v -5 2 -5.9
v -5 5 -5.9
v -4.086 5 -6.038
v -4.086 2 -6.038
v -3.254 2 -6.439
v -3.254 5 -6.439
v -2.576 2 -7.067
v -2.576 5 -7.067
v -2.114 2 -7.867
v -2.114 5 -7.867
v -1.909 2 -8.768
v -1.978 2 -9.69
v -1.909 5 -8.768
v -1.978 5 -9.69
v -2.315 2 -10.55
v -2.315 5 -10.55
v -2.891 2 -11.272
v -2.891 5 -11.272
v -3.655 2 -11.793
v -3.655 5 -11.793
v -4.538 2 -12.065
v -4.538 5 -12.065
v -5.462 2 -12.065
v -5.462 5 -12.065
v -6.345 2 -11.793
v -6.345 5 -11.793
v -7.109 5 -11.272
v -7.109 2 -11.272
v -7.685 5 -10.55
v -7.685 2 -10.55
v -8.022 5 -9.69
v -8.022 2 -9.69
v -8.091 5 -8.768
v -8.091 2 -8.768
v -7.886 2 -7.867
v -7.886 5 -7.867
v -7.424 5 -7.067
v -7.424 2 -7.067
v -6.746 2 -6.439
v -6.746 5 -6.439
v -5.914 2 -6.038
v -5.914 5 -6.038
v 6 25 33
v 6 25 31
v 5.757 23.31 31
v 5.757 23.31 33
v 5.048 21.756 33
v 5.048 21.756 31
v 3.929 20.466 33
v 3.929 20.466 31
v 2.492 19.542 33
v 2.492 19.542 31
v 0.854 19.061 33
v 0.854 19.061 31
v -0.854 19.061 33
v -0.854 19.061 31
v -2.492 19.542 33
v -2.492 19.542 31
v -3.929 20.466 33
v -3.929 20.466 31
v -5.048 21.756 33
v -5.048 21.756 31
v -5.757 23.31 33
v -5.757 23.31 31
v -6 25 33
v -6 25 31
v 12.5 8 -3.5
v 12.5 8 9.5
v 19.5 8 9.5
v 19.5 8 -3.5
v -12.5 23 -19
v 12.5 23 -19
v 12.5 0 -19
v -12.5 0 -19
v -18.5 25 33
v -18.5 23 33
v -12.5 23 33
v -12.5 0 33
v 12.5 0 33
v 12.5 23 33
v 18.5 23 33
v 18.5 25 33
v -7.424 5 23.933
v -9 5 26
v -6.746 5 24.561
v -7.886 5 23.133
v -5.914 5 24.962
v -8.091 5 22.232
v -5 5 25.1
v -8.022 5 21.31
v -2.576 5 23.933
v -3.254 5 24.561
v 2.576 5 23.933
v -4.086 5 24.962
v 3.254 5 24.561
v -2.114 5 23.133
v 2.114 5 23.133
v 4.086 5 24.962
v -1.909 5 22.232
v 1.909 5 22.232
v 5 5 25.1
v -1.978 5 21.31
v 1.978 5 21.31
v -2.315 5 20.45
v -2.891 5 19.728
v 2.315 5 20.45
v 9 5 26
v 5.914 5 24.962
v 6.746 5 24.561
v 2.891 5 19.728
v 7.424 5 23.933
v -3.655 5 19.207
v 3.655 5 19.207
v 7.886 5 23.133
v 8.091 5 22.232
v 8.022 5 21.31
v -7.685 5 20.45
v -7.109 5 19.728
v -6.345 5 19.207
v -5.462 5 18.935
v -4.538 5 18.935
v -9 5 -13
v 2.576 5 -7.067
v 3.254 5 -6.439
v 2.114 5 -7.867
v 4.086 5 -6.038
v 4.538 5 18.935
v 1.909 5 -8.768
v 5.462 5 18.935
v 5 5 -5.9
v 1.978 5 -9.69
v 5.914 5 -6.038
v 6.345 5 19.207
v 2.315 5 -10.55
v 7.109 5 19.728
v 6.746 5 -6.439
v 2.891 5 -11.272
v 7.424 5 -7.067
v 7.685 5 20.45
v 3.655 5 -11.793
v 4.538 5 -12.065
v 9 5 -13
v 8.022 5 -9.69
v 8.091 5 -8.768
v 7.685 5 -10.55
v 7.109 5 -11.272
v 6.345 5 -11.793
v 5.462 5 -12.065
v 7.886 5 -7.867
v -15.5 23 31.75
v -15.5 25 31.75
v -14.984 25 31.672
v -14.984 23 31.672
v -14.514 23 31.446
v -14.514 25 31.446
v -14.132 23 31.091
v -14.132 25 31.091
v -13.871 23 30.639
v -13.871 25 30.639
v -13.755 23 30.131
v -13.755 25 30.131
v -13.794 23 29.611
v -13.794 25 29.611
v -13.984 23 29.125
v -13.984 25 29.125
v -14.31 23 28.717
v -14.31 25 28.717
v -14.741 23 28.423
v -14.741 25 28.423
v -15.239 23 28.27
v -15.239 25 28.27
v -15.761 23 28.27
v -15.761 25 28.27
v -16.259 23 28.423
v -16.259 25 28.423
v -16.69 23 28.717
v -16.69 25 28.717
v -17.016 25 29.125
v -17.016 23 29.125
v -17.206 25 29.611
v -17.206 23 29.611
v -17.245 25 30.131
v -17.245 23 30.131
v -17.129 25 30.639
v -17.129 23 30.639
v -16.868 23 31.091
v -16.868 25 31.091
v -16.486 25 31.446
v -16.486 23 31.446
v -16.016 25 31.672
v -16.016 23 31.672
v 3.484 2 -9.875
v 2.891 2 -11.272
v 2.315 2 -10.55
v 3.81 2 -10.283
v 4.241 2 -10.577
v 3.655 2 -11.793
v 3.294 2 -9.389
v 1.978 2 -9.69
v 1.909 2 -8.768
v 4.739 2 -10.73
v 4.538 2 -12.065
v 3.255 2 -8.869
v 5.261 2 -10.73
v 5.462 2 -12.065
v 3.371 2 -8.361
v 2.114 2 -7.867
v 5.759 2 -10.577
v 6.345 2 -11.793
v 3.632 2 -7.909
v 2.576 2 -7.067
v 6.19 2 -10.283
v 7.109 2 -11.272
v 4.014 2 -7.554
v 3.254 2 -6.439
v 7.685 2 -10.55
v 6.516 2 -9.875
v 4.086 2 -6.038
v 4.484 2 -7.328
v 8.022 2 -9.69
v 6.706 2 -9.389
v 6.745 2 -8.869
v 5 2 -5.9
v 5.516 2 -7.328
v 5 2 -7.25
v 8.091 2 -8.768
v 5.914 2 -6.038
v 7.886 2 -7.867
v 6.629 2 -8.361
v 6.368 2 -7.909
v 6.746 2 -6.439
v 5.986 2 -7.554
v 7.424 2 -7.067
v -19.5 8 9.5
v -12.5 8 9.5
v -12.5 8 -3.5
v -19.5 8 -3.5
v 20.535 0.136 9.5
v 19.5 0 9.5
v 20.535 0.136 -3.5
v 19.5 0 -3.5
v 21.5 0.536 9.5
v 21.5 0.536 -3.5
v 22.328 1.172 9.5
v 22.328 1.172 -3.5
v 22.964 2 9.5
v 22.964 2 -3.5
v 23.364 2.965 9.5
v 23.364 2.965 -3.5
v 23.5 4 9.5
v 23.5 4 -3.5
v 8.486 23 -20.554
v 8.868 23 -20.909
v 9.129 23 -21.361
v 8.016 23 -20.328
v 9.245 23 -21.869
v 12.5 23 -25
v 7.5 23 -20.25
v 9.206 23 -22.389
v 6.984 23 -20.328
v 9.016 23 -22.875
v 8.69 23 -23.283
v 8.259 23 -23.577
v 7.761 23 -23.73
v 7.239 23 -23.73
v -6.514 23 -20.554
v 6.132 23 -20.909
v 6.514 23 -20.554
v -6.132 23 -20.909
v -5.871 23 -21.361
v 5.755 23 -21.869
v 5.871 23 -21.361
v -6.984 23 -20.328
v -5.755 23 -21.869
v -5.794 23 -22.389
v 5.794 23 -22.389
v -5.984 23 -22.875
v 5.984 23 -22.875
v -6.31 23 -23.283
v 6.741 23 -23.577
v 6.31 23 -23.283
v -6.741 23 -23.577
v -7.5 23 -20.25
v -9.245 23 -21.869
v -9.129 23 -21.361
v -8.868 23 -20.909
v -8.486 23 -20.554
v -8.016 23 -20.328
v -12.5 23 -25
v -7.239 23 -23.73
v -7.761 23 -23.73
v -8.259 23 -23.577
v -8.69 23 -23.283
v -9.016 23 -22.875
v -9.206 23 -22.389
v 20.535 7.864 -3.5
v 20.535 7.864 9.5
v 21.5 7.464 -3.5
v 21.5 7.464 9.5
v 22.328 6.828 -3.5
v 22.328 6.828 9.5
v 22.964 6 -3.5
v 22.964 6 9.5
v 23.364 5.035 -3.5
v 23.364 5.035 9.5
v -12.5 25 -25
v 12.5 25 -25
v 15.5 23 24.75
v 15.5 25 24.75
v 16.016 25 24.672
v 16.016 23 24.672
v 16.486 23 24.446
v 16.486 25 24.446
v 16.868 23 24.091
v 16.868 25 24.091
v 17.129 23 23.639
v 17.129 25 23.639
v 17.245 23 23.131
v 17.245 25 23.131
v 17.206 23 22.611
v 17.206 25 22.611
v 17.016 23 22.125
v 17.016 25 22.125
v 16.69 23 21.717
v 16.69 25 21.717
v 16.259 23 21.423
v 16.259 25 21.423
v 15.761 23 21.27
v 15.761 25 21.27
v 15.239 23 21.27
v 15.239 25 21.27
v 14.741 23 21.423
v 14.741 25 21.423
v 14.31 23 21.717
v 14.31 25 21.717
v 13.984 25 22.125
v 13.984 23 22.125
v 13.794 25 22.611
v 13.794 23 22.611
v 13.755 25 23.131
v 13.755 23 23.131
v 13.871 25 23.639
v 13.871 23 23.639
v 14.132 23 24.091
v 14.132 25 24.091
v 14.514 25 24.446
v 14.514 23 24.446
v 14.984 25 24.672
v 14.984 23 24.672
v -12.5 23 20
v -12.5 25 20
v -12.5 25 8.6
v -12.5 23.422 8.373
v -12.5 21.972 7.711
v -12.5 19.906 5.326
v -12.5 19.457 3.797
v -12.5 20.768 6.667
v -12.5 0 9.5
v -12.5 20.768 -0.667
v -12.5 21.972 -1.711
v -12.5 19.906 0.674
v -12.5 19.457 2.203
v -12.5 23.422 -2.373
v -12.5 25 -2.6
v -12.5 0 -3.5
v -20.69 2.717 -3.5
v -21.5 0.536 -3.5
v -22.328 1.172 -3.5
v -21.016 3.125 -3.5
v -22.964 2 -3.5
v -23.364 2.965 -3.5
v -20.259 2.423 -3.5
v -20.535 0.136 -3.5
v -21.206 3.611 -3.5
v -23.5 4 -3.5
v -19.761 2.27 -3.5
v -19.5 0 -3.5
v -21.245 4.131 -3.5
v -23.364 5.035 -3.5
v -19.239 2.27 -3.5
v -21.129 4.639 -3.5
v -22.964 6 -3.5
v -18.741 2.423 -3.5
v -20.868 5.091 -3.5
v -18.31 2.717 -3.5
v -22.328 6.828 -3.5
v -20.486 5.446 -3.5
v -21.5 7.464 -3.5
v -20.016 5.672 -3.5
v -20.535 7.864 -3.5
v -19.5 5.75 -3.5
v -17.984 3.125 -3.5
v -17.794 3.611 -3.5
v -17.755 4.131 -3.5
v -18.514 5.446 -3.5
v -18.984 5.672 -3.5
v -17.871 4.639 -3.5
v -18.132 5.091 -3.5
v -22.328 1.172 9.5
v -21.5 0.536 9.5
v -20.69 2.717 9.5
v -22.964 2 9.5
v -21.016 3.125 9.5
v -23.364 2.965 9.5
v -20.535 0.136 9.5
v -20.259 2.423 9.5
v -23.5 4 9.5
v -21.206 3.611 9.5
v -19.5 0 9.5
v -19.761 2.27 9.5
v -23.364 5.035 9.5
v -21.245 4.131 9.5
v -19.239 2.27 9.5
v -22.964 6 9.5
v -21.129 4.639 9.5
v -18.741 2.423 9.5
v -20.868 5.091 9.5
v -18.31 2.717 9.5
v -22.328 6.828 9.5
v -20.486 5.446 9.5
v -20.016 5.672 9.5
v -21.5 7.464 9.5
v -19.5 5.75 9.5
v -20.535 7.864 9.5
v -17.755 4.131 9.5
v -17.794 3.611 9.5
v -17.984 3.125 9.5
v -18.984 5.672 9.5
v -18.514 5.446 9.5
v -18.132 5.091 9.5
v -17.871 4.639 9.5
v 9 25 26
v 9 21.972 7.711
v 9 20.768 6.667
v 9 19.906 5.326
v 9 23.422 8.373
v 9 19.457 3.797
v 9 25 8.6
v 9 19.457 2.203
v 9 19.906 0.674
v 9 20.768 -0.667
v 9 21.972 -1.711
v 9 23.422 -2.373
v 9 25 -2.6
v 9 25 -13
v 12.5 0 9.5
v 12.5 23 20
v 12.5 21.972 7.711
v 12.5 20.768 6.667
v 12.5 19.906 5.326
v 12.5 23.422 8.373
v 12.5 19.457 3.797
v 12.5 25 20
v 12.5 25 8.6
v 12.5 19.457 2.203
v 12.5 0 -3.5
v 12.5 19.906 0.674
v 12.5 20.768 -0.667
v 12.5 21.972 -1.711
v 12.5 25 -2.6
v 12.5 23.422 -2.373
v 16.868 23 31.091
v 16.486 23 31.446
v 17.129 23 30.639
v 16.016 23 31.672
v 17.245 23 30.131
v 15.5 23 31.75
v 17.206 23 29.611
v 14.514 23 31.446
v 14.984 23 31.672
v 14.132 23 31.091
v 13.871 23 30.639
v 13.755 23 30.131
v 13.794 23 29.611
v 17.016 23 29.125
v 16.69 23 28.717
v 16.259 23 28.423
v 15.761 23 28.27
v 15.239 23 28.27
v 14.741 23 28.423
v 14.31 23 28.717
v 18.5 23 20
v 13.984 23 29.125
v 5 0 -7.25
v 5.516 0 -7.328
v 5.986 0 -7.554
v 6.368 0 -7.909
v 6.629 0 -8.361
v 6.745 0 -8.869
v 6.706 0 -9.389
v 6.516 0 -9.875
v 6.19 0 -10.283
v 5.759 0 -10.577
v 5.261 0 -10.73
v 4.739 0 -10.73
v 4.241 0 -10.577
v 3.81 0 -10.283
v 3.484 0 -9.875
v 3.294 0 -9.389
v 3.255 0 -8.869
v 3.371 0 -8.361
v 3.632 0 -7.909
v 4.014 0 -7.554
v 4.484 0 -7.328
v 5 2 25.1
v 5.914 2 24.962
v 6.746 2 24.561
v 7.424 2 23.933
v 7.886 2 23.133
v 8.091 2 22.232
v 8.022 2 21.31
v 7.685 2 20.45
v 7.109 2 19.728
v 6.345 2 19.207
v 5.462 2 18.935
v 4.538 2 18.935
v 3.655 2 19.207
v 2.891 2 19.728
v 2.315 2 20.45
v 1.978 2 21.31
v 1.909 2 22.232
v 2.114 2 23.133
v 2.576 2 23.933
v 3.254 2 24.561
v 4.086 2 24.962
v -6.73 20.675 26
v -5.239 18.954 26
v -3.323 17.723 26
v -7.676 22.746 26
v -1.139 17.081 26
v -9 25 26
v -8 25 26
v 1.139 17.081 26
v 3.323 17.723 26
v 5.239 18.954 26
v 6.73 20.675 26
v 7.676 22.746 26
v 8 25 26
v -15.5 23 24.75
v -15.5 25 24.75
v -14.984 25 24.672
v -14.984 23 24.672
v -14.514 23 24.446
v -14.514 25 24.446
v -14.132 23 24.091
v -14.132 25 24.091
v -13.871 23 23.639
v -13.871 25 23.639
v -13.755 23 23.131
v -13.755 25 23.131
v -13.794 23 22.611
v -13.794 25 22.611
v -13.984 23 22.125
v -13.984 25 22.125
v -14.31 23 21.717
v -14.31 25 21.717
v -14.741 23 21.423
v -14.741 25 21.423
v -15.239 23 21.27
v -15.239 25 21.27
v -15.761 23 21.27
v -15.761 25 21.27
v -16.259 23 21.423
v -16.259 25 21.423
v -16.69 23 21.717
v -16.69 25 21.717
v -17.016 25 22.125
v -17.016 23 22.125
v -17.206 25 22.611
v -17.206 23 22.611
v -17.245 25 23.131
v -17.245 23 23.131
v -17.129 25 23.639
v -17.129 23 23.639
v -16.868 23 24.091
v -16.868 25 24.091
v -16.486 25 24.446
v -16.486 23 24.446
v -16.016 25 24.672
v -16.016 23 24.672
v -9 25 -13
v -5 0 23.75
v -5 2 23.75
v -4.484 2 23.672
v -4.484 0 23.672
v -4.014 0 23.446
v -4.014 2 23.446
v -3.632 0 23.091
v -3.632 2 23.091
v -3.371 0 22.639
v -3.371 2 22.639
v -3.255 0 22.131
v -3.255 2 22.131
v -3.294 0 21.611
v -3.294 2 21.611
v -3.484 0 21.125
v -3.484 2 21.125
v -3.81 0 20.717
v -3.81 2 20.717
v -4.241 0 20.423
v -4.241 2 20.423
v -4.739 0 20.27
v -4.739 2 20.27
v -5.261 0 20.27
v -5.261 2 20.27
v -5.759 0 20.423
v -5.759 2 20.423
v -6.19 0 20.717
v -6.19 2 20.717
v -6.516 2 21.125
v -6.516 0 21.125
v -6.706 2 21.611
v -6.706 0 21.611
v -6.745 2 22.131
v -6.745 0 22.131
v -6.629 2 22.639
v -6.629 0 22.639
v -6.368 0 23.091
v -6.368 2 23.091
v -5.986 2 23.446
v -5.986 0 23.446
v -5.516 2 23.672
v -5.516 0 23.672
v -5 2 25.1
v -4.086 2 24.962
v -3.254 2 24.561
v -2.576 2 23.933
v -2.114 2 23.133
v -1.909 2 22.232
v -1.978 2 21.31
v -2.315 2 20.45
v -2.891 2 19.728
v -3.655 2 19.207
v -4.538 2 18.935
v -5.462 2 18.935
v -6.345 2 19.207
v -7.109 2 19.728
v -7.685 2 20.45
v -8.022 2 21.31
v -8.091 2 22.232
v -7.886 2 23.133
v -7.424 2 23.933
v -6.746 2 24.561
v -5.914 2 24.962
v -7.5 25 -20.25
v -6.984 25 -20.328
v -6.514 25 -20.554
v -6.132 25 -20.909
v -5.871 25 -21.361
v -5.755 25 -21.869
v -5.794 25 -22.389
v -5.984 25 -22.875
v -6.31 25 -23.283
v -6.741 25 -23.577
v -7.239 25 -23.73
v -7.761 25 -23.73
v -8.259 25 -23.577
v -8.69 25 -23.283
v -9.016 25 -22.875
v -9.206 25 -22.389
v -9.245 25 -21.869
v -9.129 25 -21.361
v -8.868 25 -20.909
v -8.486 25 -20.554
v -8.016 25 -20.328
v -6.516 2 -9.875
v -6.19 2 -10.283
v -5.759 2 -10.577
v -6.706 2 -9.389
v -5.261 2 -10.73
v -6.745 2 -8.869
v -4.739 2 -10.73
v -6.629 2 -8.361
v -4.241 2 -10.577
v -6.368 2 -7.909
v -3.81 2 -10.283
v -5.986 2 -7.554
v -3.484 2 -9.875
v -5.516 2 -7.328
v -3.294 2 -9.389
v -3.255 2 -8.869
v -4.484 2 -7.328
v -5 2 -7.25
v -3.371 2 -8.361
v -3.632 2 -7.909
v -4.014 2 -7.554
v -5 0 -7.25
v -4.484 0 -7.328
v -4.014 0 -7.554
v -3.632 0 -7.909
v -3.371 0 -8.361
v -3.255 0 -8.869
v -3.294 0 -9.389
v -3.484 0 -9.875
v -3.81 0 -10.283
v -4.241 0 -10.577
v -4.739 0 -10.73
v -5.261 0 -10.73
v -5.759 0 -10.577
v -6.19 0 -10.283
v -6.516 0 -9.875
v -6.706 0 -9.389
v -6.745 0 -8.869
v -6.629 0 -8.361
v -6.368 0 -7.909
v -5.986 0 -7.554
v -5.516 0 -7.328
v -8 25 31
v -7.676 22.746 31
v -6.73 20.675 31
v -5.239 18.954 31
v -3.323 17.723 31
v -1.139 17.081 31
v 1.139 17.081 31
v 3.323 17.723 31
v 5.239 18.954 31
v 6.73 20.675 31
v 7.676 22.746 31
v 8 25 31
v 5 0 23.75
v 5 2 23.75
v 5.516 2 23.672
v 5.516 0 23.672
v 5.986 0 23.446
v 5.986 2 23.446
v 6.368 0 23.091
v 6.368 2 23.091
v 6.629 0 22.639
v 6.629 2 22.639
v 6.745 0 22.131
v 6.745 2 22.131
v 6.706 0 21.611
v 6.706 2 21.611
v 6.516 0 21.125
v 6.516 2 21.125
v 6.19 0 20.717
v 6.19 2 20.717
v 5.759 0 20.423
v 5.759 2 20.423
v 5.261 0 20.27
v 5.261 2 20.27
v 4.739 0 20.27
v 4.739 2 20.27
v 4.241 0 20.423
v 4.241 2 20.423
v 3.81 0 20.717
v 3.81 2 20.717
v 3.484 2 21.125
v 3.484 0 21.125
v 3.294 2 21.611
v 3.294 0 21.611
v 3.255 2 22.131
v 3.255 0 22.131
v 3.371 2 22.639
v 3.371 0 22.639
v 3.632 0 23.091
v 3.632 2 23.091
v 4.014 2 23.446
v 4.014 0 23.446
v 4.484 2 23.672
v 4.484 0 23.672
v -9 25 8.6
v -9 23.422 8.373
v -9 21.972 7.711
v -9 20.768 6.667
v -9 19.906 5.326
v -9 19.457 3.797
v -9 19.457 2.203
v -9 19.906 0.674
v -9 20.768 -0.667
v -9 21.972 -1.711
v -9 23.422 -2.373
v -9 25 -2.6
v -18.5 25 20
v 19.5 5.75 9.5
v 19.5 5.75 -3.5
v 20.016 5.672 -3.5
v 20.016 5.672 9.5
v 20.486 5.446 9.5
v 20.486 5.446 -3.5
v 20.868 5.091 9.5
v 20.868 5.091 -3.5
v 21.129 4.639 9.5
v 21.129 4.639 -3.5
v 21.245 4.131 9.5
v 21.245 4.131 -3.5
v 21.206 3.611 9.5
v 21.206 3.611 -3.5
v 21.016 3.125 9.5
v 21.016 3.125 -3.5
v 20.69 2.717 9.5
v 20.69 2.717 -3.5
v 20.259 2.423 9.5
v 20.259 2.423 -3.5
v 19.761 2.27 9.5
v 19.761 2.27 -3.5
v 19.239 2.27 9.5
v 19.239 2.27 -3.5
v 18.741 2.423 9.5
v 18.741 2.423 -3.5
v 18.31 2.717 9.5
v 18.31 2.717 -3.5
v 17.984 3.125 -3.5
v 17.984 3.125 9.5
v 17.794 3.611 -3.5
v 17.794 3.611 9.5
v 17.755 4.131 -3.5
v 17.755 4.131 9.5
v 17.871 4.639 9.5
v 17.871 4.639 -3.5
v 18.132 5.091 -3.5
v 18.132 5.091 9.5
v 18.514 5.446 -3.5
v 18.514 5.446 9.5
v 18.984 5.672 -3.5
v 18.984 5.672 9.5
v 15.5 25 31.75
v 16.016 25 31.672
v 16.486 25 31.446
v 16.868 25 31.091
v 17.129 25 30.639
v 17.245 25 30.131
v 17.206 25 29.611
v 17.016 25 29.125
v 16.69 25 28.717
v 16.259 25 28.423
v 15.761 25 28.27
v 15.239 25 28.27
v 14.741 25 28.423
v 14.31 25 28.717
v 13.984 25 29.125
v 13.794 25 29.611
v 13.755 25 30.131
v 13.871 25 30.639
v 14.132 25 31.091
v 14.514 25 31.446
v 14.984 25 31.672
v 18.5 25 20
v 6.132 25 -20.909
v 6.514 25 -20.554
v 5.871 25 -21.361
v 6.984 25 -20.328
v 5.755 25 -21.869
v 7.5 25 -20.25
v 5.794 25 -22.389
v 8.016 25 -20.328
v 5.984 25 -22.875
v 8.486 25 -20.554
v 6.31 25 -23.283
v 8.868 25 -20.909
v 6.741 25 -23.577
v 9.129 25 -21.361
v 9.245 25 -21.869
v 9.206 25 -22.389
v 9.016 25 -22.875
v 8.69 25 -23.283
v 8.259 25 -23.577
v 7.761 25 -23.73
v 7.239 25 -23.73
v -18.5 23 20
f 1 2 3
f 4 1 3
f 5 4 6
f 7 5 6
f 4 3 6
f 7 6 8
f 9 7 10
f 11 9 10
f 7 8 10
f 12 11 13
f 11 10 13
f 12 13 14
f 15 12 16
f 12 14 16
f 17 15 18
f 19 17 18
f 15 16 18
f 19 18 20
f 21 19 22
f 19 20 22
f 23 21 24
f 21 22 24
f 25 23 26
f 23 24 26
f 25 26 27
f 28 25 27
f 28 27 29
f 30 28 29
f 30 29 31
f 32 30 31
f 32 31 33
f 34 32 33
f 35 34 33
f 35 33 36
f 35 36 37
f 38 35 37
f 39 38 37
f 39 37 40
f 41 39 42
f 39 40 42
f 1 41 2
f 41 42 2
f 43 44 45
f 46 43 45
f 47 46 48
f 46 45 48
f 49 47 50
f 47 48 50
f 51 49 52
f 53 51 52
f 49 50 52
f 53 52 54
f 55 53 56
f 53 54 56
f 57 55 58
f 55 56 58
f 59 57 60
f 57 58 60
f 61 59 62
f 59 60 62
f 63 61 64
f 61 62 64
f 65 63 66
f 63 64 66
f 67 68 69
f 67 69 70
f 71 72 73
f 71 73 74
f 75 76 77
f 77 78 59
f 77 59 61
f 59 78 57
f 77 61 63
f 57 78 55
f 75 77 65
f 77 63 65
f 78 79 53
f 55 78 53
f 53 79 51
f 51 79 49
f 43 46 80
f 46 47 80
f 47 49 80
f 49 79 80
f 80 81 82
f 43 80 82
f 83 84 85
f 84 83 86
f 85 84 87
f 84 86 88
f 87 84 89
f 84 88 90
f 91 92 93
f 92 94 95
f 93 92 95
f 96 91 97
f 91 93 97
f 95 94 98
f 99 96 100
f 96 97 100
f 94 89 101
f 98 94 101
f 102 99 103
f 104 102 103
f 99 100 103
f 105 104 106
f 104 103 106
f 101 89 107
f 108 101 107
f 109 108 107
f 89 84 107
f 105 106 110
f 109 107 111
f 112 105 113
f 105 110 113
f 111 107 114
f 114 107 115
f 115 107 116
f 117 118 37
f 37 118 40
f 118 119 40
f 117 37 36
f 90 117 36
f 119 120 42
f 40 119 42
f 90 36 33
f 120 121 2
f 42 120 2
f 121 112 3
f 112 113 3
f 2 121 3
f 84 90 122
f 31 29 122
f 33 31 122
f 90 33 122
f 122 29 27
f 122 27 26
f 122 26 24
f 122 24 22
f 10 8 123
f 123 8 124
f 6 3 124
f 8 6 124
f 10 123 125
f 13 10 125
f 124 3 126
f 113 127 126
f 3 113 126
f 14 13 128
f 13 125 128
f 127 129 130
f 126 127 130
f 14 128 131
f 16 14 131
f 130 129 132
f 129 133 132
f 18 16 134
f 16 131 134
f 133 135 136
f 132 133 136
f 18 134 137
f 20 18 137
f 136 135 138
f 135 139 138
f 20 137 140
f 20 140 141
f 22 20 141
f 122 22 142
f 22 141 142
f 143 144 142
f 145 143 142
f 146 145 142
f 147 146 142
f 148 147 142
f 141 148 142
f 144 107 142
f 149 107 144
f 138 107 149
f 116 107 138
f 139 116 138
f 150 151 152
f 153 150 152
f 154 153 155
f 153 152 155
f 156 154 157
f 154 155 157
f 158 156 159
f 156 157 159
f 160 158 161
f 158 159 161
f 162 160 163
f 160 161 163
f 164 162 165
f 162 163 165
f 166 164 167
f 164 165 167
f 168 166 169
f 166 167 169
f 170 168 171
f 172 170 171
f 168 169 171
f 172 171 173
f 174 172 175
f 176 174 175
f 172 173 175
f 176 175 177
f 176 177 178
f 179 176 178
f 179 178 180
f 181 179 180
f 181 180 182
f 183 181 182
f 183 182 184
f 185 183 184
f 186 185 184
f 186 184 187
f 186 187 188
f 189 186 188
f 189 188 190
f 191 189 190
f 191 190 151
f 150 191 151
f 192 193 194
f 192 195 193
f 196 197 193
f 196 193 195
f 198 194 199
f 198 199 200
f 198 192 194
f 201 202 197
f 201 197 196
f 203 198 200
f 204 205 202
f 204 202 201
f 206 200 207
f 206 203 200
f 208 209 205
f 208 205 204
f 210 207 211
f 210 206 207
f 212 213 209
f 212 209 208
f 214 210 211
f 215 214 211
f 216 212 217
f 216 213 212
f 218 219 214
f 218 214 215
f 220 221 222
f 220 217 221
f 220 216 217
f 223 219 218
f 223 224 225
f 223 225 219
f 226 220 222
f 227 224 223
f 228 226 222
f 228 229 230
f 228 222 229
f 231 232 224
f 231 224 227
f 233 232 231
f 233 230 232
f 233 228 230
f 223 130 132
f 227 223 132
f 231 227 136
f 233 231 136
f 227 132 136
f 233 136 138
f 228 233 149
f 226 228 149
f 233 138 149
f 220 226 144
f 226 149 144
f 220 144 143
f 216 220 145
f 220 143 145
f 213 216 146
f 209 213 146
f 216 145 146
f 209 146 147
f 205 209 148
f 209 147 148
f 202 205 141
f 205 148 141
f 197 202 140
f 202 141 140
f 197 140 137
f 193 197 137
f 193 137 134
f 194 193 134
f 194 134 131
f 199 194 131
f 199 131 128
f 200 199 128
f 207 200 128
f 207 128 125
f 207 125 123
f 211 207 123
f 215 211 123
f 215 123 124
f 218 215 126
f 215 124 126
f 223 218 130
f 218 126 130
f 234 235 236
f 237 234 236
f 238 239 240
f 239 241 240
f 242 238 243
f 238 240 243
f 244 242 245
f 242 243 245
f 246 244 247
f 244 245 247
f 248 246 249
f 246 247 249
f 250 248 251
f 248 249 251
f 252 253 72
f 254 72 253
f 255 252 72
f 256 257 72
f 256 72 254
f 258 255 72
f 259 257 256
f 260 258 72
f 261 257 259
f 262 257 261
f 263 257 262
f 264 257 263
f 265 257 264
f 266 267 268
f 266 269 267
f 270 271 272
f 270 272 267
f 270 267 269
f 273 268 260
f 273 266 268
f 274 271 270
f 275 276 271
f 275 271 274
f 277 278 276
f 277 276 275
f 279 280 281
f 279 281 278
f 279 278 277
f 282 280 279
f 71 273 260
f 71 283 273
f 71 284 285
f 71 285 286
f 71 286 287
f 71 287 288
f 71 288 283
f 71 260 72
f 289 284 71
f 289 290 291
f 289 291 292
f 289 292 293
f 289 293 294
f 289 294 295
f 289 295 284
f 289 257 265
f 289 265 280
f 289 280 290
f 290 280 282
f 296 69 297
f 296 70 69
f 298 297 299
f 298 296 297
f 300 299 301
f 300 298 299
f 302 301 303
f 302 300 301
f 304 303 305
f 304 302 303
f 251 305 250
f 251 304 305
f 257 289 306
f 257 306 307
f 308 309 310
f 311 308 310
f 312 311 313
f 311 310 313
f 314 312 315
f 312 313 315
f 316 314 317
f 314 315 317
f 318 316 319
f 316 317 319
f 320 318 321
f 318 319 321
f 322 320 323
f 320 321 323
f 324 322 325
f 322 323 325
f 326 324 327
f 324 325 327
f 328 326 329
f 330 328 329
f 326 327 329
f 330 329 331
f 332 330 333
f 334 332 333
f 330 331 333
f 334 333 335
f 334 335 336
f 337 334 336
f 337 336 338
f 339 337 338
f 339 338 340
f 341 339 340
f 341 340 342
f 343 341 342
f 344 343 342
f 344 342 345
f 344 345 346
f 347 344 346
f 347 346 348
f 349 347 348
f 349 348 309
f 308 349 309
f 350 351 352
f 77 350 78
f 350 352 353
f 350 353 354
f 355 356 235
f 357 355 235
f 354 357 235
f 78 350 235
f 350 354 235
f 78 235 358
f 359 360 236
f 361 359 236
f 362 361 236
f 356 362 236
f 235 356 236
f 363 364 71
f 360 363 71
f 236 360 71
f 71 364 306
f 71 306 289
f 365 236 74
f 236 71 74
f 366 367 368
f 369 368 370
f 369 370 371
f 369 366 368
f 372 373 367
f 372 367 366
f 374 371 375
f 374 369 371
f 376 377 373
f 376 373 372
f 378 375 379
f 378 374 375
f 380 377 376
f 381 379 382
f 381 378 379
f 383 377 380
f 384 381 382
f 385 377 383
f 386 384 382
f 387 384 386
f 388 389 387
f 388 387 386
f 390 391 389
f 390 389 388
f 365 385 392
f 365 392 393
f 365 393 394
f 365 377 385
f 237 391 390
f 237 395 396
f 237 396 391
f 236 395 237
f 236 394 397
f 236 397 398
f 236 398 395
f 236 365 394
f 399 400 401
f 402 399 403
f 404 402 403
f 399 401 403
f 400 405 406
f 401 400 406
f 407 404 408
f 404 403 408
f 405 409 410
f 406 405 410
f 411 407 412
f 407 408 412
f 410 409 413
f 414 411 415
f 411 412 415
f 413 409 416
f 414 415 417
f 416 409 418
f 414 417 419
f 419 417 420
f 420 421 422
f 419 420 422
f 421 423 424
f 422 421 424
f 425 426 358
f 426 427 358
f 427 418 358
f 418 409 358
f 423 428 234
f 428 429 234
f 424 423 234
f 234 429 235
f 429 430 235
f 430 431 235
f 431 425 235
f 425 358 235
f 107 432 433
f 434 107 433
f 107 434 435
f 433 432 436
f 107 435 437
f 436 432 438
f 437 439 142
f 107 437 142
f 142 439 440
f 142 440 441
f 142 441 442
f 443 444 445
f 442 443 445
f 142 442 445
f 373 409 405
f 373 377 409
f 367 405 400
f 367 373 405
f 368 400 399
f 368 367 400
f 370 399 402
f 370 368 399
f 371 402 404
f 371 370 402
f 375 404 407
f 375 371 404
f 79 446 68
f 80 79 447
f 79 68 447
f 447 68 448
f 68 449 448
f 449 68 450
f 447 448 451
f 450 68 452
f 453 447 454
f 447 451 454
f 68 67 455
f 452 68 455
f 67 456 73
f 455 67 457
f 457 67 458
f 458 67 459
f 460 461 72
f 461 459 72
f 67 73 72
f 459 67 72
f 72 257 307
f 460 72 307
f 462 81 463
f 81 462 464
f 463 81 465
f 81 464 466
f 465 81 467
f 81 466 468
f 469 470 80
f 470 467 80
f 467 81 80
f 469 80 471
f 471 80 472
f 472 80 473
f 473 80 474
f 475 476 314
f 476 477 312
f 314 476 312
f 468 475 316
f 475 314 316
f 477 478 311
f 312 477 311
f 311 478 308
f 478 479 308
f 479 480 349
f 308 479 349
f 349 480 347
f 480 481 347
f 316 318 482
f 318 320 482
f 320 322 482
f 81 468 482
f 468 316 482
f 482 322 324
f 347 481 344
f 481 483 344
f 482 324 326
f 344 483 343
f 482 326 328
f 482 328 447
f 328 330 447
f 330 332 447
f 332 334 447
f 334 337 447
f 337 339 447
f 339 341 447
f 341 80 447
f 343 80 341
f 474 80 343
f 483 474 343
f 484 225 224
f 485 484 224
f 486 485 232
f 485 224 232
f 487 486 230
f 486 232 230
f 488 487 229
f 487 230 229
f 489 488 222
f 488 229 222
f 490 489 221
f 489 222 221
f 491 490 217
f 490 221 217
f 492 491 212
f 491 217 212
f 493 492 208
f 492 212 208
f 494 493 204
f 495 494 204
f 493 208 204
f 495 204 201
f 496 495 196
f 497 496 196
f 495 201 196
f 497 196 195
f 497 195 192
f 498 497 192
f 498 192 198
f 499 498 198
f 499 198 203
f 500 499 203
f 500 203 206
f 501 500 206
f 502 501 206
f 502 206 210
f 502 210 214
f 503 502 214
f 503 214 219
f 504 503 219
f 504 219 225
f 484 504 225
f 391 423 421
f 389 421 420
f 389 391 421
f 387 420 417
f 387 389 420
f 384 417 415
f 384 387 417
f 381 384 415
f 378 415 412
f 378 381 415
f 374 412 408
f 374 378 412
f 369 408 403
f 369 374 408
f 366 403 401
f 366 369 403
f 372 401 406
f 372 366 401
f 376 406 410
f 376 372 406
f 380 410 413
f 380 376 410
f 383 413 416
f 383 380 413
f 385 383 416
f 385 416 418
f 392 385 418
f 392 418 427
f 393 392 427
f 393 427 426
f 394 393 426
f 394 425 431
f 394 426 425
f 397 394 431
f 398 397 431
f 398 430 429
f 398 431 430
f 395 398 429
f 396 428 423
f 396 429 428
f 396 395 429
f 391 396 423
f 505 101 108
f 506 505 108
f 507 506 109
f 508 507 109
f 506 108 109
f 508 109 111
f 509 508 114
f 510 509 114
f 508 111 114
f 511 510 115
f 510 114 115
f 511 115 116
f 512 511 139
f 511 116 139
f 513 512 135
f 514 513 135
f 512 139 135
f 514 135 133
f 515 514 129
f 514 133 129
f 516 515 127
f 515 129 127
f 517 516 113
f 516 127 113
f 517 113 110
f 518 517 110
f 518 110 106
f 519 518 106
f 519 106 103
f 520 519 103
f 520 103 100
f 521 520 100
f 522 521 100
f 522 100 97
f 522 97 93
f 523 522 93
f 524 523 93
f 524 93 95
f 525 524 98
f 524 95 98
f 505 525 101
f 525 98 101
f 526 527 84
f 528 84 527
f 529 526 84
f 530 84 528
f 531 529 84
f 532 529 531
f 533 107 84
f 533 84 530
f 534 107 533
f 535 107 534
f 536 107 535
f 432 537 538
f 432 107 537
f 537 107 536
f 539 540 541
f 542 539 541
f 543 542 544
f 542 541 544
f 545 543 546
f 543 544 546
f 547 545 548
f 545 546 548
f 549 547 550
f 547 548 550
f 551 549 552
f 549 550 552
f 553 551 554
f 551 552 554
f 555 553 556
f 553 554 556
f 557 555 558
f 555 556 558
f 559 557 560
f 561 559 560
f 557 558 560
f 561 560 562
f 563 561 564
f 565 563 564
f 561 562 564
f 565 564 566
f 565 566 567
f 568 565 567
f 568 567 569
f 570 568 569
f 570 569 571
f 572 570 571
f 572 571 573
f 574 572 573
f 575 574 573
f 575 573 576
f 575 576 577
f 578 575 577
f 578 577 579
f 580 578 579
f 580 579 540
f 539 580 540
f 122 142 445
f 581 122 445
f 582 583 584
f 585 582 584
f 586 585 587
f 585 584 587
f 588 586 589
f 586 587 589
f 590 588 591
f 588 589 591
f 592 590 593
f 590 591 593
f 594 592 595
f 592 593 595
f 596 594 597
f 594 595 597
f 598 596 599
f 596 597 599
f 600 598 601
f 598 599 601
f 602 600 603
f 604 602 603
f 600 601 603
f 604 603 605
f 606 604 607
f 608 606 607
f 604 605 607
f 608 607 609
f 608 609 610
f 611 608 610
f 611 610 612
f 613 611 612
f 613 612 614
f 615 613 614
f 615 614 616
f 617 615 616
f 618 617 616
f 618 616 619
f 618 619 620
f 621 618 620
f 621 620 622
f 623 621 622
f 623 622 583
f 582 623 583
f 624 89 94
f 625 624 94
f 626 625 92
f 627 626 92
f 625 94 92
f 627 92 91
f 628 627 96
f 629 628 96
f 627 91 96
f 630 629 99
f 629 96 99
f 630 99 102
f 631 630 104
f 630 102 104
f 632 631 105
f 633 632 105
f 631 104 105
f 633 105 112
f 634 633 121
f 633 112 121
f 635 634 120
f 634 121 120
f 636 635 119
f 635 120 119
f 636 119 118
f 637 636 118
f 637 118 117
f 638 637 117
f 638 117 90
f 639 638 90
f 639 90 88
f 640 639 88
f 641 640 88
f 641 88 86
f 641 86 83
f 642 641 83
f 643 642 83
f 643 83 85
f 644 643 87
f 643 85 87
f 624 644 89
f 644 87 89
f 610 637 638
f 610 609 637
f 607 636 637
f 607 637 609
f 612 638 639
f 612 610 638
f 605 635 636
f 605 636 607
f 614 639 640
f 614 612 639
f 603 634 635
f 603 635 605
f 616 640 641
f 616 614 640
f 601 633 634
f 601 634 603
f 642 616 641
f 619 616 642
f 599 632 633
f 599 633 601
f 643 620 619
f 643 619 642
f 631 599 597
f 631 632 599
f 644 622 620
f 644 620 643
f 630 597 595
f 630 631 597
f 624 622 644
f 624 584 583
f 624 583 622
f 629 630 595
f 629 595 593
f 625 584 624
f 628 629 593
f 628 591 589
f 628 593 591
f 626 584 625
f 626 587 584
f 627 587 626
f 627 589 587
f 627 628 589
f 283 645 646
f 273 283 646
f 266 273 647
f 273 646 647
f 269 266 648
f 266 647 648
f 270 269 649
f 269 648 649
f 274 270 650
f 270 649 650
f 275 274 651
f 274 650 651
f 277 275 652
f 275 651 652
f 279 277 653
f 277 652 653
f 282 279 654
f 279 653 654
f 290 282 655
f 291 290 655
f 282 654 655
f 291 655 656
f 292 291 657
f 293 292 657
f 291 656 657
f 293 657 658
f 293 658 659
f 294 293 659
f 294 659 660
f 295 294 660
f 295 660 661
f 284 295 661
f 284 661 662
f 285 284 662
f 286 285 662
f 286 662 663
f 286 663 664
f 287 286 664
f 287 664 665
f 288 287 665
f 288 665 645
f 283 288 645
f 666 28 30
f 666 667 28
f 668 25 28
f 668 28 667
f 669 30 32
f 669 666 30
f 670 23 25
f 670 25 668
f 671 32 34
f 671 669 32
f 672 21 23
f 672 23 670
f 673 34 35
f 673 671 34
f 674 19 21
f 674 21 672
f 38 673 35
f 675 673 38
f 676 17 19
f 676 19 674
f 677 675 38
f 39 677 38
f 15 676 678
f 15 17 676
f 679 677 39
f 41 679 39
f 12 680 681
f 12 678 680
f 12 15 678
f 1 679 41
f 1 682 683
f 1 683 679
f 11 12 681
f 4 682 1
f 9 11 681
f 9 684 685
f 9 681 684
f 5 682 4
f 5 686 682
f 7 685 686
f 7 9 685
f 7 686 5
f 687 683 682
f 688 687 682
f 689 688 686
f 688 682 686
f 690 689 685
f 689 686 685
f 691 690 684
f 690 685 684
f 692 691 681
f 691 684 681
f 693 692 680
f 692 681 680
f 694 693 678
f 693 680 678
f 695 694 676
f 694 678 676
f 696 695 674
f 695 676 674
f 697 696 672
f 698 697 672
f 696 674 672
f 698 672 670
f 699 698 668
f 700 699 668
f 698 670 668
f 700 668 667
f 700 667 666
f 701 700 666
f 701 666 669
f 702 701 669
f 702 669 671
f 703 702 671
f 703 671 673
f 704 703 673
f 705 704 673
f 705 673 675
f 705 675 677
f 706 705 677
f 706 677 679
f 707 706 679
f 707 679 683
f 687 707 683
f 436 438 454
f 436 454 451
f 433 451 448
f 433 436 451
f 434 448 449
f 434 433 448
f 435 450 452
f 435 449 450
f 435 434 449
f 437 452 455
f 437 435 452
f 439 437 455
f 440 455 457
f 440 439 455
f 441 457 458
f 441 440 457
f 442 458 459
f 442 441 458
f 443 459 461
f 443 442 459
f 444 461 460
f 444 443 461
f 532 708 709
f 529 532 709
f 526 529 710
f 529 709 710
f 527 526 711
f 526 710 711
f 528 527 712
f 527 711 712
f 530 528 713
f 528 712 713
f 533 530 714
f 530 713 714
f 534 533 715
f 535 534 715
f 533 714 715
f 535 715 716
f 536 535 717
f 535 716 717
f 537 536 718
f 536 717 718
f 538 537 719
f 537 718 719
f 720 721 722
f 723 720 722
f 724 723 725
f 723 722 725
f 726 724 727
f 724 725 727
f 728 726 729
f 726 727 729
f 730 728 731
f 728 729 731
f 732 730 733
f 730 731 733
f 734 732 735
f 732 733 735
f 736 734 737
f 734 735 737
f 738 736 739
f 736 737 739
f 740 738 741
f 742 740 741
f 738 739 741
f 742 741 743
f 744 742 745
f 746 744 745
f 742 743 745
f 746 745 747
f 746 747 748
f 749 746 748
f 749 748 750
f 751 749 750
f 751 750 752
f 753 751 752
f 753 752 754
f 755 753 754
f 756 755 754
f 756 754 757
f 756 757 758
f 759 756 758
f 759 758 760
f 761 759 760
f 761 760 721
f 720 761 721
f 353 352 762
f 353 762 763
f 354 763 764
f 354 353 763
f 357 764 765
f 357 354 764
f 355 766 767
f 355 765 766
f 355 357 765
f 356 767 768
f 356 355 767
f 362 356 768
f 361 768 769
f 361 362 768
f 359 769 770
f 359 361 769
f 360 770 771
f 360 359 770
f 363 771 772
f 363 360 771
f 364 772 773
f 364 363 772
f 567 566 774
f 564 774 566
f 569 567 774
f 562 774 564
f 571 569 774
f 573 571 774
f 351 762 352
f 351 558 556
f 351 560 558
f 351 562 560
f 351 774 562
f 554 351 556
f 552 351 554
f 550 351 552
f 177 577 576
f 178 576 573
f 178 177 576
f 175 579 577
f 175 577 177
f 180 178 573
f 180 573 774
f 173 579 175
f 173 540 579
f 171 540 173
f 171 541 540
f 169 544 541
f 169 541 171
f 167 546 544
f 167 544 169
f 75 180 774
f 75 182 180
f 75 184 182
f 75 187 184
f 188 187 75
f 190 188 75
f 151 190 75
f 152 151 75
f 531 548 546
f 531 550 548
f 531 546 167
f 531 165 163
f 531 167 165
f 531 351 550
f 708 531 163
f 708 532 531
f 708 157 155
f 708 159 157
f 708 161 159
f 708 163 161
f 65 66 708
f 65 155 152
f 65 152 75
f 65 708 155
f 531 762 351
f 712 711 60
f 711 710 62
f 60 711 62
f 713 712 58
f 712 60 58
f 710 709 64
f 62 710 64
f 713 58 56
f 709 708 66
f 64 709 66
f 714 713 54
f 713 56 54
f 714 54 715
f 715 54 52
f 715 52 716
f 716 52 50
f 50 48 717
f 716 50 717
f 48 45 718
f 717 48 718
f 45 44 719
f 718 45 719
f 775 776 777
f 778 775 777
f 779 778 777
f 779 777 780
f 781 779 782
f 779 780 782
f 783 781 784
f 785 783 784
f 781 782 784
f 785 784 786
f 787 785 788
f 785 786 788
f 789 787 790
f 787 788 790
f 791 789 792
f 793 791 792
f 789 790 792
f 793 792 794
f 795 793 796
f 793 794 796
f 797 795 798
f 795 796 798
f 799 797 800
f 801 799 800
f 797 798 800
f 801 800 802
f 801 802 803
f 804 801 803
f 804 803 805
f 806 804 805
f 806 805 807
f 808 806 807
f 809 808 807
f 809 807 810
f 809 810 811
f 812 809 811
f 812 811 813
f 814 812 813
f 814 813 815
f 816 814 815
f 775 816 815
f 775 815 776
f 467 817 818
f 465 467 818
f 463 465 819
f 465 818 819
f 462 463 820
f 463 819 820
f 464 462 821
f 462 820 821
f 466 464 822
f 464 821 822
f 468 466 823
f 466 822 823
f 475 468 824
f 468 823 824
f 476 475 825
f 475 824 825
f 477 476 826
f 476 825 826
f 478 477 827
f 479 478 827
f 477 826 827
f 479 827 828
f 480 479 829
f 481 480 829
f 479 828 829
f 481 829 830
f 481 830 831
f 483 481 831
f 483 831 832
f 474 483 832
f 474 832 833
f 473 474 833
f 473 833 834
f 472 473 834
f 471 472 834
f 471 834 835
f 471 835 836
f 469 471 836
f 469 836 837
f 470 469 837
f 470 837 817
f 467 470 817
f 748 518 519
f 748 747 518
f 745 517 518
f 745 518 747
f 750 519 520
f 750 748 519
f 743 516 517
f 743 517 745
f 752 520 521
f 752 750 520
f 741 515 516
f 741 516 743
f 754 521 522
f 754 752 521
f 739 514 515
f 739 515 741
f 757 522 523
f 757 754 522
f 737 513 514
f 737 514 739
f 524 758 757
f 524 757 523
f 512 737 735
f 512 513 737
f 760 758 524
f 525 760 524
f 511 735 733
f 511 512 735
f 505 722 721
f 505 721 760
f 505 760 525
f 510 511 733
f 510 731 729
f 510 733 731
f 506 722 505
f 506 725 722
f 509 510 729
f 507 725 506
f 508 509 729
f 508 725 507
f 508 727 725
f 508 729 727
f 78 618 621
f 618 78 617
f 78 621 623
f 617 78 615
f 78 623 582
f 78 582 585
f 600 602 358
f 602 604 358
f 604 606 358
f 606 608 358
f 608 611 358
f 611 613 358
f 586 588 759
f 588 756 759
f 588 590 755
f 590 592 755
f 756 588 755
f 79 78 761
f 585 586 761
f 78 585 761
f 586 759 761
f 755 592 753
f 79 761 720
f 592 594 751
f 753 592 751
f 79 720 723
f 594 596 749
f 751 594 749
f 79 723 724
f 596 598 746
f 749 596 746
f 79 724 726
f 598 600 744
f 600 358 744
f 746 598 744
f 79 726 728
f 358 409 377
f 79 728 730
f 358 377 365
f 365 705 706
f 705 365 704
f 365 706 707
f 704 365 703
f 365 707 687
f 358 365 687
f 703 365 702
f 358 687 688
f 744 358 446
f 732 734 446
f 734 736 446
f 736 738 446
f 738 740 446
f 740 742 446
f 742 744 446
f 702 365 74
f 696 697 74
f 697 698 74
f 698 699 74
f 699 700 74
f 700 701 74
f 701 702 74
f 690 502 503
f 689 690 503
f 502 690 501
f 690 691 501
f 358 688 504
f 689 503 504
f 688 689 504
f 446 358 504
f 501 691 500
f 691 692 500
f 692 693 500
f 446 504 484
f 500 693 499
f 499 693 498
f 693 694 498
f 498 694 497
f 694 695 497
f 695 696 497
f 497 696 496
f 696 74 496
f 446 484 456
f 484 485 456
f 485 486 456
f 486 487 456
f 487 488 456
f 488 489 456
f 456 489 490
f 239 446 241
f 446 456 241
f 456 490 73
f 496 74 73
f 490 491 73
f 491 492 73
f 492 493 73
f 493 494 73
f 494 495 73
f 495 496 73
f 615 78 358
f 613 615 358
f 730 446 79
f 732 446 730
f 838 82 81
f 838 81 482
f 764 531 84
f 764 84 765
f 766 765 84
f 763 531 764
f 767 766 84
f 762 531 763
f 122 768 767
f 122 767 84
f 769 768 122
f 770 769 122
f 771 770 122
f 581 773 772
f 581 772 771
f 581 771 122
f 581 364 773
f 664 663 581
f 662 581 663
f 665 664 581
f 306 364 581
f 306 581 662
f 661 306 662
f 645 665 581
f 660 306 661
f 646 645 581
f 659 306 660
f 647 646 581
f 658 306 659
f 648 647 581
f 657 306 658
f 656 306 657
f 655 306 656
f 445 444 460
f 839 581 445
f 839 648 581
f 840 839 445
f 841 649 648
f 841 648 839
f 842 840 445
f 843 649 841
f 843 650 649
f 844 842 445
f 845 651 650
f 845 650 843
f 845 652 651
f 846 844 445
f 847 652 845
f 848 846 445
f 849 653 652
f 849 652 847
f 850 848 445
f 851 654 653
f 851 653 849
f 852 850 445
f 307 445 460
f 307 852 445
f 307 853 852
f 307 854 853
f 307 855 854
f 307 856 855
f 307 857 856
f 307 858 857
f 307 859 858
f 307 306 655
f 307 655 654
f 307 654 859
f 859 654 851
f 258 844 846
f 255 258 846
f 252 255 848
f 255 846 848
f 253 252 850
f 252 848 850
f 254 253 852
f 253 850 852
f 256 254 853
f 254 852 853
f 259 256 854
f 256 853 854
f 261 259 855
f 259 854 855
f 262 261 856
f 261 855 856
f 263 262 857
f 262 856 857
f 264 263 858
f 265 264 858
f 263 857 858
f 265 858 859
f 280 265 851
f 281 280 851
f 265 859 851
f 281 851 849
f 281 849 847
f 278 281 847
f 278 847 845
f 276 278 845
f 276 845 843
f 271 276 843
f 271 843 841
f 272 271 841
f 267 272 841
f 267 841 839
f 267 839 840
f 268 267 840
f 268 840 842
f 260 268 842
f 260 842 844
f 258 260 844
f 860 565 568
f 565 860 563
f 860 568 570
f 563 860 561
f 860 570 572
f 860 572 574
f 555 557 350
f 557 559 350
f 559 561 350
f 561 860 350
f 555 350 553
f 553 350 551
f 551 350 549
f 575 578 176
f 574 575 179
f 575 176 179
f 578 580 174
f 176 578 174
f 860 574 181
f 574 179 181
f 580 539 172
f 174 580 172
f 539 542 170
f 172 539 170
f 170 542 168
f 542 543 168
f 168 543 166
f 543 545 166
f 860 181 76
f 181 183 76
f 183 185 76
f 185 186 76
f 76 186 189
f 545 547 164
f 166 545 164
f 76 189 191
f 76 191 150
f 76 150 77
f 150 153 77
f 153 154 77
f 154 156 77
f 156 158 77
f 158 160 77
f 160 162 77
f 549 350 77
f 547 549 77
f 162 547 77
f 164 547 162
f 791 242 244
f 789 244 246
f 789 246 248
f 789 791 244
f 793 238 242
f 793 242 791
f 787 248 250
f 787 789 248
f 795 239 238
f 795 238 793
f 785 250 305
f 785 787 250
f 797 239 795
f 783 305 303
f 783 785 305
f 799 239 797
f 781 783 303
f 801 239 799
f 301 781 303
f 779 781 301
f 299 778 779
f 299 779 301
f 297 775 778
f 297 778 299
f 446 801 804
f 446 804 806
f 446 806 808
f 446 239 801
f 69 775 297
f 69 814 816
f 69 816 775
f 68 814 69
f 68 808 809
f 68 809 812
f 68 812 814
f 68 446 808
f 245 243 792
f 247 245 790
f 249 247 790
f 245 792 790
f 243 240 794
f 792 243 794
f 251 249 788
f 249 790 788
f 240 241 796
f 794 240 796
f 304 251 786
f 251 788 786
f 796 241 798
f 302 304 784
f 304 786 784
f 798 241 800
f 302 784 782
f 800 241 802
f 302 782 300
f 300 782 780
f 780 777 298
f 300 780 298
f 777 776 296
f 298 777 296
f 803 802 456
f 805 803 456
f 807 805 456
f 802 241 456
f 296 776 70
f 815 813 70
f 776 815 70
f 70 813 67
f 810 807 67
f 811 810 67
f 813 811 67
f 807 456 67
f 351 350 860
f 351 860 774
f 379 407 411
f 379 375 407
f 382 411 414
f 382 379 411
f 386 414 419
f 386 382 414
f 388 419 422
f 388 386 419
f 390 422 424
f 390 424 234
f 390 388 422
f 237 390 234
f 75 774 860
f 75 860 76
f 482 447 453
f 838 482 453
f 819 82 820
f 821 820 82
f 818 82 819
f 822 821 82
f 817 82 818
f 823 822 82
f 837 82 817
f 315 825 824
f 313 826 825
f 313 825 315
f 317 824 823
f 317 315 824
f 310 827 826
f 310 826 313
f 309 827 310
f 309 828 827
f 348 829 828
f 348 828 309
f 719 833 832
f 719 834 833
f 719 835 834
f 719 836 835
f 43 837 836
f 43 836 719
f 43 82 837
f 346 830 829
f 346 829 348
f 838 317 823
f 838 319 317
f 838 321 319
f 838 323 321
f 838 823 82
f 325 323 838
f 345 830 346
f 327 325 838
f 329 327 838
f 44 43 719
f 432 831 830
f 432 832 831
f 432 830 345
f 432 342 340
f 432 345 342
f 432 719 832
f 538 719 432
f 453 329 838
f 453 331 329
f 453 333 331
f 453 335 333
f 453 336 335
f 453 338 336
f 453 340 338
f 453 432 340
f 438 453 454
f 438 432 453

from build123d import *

# Parameters (mm, degrees)
CROQUIS2_W                 = 25
CROQUIS2_H                 = 50
SALIENTE_EXTRUIR2_DEPTH    = 25
CROQUIS21_W                = 25
CROQUIS21_H                = 25
SALIENTE_EXTRUIR11_DEPTH   = 6
CROQUIS4_W                 = 39
CROQUIS4_H                 = 20
CORTAR_EXTRUIR1_DEPTH      = 9
CORTAR_EXTRUIR2_DEPTH      = 42.740268327
CORTAR_EXTRUIR2_DEPTH_BACK = 42.740268327
CROQUIS9_R                 = 8
CORTAR_EXTRUIR3_DEPTH      = 5
SALIENTE_EXTRUIR12_DEPTH   = 2
CROQUIS11_W                = 13
CROQUIS11_H                = 2
SALIENTE_EXTRUIR4_DEPTH    = 6
CROQUIS12_R                = 1.75
CORTAR_EXTRUIR4_DEPTH      = 46.345892868
CROQUIS13_W                = 13
CROQUIS13_H                = 2
SALIENTE_EXTRUIR5_DEPTH    = 6
CROQUIS14_R                = 1.75
CORTAR_EXTRUIR5_DEPTH      = 46.345892868
CROQUIS16_R                = 1.75
CORTAR_EXTRUIR6_DEPTH      = 46.345892868
CROQUIS24_R                = 1.75
CORTAR_EXTRUIR8_DEPTH      = 43.793106922
CROQUIS25_W                = 25
CROQUIS25_H                = 23
CORTAR_EXTRUIR9_DEPTH      = 6
CROQUIS28_W                = 13
CROQUIS28_H                = 8
SALIENTE_EXTRUIR13_DEPTH   = 11
REDONDEO1_R                = 4
CROQUIS29_R                = 1.75
CORTAR_EXTRUIR10_DEPTH     = 51.094909921
REDONDEO1_OF_SIMETR_A1_R   = 4
CROQUIS30_R                = 3.1
CORTAR_EXTRUIR11_DEPTH     = 3


with BuildPart() as part:
    # Croquis2 → Saliente-Extruir2 (new body)
    with BuildSketch(Plane(origin=(0, 0, 0), x_dir=(1, 0, 0), z_dir=(0, 1, 0))):
        Rectangle(CROQUIS2_W, CROQUIS2_H)
    extrude(amount=SALIENTE_EXTRUIR2_DEPTH)

    # Croquis21 → Saliente-Extruir11 (add)
    with BuildSketch(Plane.XY.offset(25)):
        with Locations((0, 12.5)):
            Rectangle(CROQUIS21_W, CROQUIS21_H)
    extrude(amount=SALIENTE_EXTRUIR11_DEPTH)

    # Croquis4 → Cortar-Extruir1 (cut, symmetric)
    with BuildSketch(Plane(origin=(0, 0, 0), x_dir=(0, 0, -1), z_dir=(1, 0, 0))):
        with Locations((-6.5, 15)):
            Rectangle(CROQUIS4_W, CROQUIS4_H)
    extrude(amount=CORTAR_EXTRUIR1_DEPTH, both=True, mode=Mode.SUBTRACT)

    # Croquis5 → Cortar-Extruir2 (cut, two sides: drawn at the far end of the back side and taken through both)
    with BuildSketch(Plane(origin=(0, 0, 0), x_dir=(0, 0, -1), z_dir=(1, 0, 0)).offset(-CORTAR_EXTRUIR2_DEPTH_BACK)):
        with BuildLine():
            ThreePointArc((2.6, 25), (-3, 30.6), (-8.6, 25))
            Line((-8.6, 25), (2.6, 25))
        make_face()
        with BuildLine():
            Line((2.6, 25), (-8.6, 25))
            ThreePointArc((-8.6, 25), (-3, 19.4), (2.6, 25))
        make_face()
    extrude(amount=CORTAR_EXTRUIR2_DEPTH + CORTAR_EXTRUIR2_DEPTH_BACK, mode=Mode.SUBTRACT)

    # Croquis9 → Cortar-Extruir3 (cut)
    with BuildSketch(Plane.XY.offset(31)):
        with Locations((0, 25)):
            Circle(CROQUIS9_R)
    extrude(amount=-CORTAR_EXTRUIR3_DEPTH, mode=Mode.SUBTRACT)

    # Croquis23 → Saliente-Extruir12 (add)
    with BuildSketch(Plane.XY.offset(31)):
        with BuildLine():
            Line((12.5, 25), (6, 25))
            ThreePointArc((6, 25), (0, 19), (-6, 25))
            Line((-6, 25), (-12.5, 25))
            Line((-12.5, 25), (-12.5, 0))
            Line((-12.5, 0), (12.5, 0))
            Line((12.5, 0), (12.5, 25))
        make_face()
    extrude(amount=SALIENTE_EXTRUIR12_DEPTH)

    # Croquis11 → Saliente-Extruir4 (add)
    with BuildSketch(Plane(origin=(12.5, 0, 0), x_dir=(0, 0, -1), z_dir=(1, 0, 0))):
        with Locations((-26.5, 24)):
            Rectangle(CROQUIS11_W, CROQUIS11_H)
    extrude(amount=SALIENTE_EXTRUIR4_DEPTH)

    # Croquis12 → Cortar-Extruir4 (cut, through all)
    with BuildSketch(Plane(origin=(0, 25, 0), x_dir=(1, 0, 0), z_dir=(0, 1, 0))):
        with Locations(Location((15.5, -23, 0), (0, 0, 270))):
            Circle(CROQUIS12_R)
        with Locations(Location((15.5, -30, 0), (0, 0, 270))):
            Circle(CROQUIS12_R)
    extrude(amount=-CORTAR_EXTRUIR4_DEPTH, mode=Mode.SUBTRACT)

    # Croquis13 → Saliente-Extruir5 (add)
    with BuildSketch(Plane.ZY.offset(12.5)):
        with Locations((26.5, 24)):
            Rectangle(CROQUIS13_W, CROQUIS13_H)
    extrude(amount=SALIENTE_EXTRUIR5_DEPTH)

    # Croquis14 → Cortar-Extruir5 (cut, through all)
    with BuildSketch(Plane(origin=(0, 25, 0), x_dir=(1, 0, 0), z_dir=(0, 1, 0))):
        with Locations(Location((-15.5, -23, 0), (0, 0, 270))):
            Circle(CROQUIS14_R)
        with Locations(Location((-15.5, -30, 0), (0, 0, 270))):
            Circle(CROQUIS14_R)
    extrude(amount=-CORTAR_EXTRUIR5_DEPTH, mode=Mode.SUBTRACT)

    # Croquis16 → Cortar-Extruir6 (cut, through all)
    with BuildSketch(Plane(origin=(0, 25, 0), x_dir=(1, 0, 0), z_dir=(0, 1, 0))):
        with Locations(Location((-7.5, 22, 0), (0, 0, 270))):
            Circle(CROQUIS16_R)
        with Locations(Location((7.5, 22, 0), (0, 0, 270))):
            Circle(CROQUIS16_R)
    extrude(amount=-CORTAR_EXTRUIR6_DEPTH, mode=Mode.SUBTRACT)

    # Croquis24 → Cortar-Extruir8 (cut, through all)
    with BuildSketch(Plane(origin=(0, 5, 0), x_dir=(1, 0, 0), z_dir=(0, 1, 0))):
        with Locations(Location((-5, -22, 0), (0, 0, 270))):
            Circle(CROQUIS24_R)
        with Locations(Location((-5, 9, 0), (0, 0, 270))):
            Circle(CROQUIS24_R)
        with Locations(Location((5, -22, 0), (0, 0, 270))):
            Circle(CROQUIS24_R)
        with Locations(Location((5, 9, 0), (0, 0, 270))):
            Circle(CROQUIS24_R)
    extrude(amount=-CORTAR_EXTRUIR8_DEPTH, mode=Mode.SUBTRACT)

    # Croquis25 → Cortar-Extruir9 (cut)
    with BuildSketch(Plane(origin=(0, 0, -25), x_dir=(-1, 0, 0), z_dir=(0, 0, -1))):
        with Locations((0, 11.5)):
            Rectangle(CROQUIS25_W, CROQUIS25_H)
    extrude(amount=-CORTAR_EXTRUIR9_DEPTH, mode=Mode.SUBTRACT)

    # Croquis28 → Saliente-Extruir13 (add)
    with BuildSketch(Plane(origin=(12.5, 0, 0), x_dir=(0, 0, -1), z_dir=(1, 0, 0))):
        with Locations((-3, 4)):
            Rectangle(CROQUIS28_W, CROQUIS28_H)
    saliente_extruir13 = extrude(amount=SALIENTE_EXTRUIR13_DEPTH)

    # Redondeo1
    redondeo1_edges = [part.edges().sort_by_distance(p)[0] for p in [
        (23.5, 0, 3),
        (23.5, 8, 3),
    ]]
    fillet(redondeo1_edges, radius=REDONDEO1_R - 0.0001)  # a hair under: the kernel refuses the full size

    # Croquis29 → Cortar-Extruir10 (cut, through all)
    with BuildSketch(Plane(origin=(0, 0, -3.5), x_dir=(-1, 0, 0), z_dir=(0, 0, -1))):
        with Locations(Location((-19.5, 4, 0), (0, 0, 90))):
            Circle(CROQUIS29_R)
    cortar_extruir10 = extrude(amount=-CORTAR_EXTRUIR10_DEPTH, mode=Mode.SUBTRACT)

    # Simetría1: Saliente-Extruir13, Cortar-Extruir10 across plane
    add(saliente_extruir13.mirror(Plane.ZY))
    add(cortar_extruir10.mirror(Plane.ZY), mode=Mode.SUBTRACT)

    # Redondeo1 of Simetría1
    redondeo1_of_simetr_a1_edges = [part.edges().sort_by_distance(p)[0] for p in [
        (-23.5, 0, 3),
        (-23.5, 8, 3),
    ]]
    fillet(redondeo1_of_simetr_a1_edges, radius=REDONDEO1_OF_SIMETR_A1_R - 0.0001)  # a hair under: the kernel refuses the full size

    # Croquis30 → Cortar-Extruir11 (cut)
    with BuildSketch(Plane(origin=(0, 5, 0), x_dir=(1, 0, 0), z_dir=(0, 1, 0))):
        with Locations(Location((-5, 9, 0), (0, 0, 270))):
            Circle(CROQUIS30_R)
        with Locations(Location((-5, -22, 0), (0, 0, 270))):
            Circle(CROQUIS30_R)
        with Locations(Location((5, -22, 0), (0, 0, 270))):
            Circle(CROQUIS30_R)
        with Locations(Location((5, 9, 0), (0, 0, 270))):
            Circle(CROQUIS30_R)
    extrude(amount=-CORTAR_EXTRUIR11_DEPTH, mode=Mode.SUBTRACT)


solid = part.part
